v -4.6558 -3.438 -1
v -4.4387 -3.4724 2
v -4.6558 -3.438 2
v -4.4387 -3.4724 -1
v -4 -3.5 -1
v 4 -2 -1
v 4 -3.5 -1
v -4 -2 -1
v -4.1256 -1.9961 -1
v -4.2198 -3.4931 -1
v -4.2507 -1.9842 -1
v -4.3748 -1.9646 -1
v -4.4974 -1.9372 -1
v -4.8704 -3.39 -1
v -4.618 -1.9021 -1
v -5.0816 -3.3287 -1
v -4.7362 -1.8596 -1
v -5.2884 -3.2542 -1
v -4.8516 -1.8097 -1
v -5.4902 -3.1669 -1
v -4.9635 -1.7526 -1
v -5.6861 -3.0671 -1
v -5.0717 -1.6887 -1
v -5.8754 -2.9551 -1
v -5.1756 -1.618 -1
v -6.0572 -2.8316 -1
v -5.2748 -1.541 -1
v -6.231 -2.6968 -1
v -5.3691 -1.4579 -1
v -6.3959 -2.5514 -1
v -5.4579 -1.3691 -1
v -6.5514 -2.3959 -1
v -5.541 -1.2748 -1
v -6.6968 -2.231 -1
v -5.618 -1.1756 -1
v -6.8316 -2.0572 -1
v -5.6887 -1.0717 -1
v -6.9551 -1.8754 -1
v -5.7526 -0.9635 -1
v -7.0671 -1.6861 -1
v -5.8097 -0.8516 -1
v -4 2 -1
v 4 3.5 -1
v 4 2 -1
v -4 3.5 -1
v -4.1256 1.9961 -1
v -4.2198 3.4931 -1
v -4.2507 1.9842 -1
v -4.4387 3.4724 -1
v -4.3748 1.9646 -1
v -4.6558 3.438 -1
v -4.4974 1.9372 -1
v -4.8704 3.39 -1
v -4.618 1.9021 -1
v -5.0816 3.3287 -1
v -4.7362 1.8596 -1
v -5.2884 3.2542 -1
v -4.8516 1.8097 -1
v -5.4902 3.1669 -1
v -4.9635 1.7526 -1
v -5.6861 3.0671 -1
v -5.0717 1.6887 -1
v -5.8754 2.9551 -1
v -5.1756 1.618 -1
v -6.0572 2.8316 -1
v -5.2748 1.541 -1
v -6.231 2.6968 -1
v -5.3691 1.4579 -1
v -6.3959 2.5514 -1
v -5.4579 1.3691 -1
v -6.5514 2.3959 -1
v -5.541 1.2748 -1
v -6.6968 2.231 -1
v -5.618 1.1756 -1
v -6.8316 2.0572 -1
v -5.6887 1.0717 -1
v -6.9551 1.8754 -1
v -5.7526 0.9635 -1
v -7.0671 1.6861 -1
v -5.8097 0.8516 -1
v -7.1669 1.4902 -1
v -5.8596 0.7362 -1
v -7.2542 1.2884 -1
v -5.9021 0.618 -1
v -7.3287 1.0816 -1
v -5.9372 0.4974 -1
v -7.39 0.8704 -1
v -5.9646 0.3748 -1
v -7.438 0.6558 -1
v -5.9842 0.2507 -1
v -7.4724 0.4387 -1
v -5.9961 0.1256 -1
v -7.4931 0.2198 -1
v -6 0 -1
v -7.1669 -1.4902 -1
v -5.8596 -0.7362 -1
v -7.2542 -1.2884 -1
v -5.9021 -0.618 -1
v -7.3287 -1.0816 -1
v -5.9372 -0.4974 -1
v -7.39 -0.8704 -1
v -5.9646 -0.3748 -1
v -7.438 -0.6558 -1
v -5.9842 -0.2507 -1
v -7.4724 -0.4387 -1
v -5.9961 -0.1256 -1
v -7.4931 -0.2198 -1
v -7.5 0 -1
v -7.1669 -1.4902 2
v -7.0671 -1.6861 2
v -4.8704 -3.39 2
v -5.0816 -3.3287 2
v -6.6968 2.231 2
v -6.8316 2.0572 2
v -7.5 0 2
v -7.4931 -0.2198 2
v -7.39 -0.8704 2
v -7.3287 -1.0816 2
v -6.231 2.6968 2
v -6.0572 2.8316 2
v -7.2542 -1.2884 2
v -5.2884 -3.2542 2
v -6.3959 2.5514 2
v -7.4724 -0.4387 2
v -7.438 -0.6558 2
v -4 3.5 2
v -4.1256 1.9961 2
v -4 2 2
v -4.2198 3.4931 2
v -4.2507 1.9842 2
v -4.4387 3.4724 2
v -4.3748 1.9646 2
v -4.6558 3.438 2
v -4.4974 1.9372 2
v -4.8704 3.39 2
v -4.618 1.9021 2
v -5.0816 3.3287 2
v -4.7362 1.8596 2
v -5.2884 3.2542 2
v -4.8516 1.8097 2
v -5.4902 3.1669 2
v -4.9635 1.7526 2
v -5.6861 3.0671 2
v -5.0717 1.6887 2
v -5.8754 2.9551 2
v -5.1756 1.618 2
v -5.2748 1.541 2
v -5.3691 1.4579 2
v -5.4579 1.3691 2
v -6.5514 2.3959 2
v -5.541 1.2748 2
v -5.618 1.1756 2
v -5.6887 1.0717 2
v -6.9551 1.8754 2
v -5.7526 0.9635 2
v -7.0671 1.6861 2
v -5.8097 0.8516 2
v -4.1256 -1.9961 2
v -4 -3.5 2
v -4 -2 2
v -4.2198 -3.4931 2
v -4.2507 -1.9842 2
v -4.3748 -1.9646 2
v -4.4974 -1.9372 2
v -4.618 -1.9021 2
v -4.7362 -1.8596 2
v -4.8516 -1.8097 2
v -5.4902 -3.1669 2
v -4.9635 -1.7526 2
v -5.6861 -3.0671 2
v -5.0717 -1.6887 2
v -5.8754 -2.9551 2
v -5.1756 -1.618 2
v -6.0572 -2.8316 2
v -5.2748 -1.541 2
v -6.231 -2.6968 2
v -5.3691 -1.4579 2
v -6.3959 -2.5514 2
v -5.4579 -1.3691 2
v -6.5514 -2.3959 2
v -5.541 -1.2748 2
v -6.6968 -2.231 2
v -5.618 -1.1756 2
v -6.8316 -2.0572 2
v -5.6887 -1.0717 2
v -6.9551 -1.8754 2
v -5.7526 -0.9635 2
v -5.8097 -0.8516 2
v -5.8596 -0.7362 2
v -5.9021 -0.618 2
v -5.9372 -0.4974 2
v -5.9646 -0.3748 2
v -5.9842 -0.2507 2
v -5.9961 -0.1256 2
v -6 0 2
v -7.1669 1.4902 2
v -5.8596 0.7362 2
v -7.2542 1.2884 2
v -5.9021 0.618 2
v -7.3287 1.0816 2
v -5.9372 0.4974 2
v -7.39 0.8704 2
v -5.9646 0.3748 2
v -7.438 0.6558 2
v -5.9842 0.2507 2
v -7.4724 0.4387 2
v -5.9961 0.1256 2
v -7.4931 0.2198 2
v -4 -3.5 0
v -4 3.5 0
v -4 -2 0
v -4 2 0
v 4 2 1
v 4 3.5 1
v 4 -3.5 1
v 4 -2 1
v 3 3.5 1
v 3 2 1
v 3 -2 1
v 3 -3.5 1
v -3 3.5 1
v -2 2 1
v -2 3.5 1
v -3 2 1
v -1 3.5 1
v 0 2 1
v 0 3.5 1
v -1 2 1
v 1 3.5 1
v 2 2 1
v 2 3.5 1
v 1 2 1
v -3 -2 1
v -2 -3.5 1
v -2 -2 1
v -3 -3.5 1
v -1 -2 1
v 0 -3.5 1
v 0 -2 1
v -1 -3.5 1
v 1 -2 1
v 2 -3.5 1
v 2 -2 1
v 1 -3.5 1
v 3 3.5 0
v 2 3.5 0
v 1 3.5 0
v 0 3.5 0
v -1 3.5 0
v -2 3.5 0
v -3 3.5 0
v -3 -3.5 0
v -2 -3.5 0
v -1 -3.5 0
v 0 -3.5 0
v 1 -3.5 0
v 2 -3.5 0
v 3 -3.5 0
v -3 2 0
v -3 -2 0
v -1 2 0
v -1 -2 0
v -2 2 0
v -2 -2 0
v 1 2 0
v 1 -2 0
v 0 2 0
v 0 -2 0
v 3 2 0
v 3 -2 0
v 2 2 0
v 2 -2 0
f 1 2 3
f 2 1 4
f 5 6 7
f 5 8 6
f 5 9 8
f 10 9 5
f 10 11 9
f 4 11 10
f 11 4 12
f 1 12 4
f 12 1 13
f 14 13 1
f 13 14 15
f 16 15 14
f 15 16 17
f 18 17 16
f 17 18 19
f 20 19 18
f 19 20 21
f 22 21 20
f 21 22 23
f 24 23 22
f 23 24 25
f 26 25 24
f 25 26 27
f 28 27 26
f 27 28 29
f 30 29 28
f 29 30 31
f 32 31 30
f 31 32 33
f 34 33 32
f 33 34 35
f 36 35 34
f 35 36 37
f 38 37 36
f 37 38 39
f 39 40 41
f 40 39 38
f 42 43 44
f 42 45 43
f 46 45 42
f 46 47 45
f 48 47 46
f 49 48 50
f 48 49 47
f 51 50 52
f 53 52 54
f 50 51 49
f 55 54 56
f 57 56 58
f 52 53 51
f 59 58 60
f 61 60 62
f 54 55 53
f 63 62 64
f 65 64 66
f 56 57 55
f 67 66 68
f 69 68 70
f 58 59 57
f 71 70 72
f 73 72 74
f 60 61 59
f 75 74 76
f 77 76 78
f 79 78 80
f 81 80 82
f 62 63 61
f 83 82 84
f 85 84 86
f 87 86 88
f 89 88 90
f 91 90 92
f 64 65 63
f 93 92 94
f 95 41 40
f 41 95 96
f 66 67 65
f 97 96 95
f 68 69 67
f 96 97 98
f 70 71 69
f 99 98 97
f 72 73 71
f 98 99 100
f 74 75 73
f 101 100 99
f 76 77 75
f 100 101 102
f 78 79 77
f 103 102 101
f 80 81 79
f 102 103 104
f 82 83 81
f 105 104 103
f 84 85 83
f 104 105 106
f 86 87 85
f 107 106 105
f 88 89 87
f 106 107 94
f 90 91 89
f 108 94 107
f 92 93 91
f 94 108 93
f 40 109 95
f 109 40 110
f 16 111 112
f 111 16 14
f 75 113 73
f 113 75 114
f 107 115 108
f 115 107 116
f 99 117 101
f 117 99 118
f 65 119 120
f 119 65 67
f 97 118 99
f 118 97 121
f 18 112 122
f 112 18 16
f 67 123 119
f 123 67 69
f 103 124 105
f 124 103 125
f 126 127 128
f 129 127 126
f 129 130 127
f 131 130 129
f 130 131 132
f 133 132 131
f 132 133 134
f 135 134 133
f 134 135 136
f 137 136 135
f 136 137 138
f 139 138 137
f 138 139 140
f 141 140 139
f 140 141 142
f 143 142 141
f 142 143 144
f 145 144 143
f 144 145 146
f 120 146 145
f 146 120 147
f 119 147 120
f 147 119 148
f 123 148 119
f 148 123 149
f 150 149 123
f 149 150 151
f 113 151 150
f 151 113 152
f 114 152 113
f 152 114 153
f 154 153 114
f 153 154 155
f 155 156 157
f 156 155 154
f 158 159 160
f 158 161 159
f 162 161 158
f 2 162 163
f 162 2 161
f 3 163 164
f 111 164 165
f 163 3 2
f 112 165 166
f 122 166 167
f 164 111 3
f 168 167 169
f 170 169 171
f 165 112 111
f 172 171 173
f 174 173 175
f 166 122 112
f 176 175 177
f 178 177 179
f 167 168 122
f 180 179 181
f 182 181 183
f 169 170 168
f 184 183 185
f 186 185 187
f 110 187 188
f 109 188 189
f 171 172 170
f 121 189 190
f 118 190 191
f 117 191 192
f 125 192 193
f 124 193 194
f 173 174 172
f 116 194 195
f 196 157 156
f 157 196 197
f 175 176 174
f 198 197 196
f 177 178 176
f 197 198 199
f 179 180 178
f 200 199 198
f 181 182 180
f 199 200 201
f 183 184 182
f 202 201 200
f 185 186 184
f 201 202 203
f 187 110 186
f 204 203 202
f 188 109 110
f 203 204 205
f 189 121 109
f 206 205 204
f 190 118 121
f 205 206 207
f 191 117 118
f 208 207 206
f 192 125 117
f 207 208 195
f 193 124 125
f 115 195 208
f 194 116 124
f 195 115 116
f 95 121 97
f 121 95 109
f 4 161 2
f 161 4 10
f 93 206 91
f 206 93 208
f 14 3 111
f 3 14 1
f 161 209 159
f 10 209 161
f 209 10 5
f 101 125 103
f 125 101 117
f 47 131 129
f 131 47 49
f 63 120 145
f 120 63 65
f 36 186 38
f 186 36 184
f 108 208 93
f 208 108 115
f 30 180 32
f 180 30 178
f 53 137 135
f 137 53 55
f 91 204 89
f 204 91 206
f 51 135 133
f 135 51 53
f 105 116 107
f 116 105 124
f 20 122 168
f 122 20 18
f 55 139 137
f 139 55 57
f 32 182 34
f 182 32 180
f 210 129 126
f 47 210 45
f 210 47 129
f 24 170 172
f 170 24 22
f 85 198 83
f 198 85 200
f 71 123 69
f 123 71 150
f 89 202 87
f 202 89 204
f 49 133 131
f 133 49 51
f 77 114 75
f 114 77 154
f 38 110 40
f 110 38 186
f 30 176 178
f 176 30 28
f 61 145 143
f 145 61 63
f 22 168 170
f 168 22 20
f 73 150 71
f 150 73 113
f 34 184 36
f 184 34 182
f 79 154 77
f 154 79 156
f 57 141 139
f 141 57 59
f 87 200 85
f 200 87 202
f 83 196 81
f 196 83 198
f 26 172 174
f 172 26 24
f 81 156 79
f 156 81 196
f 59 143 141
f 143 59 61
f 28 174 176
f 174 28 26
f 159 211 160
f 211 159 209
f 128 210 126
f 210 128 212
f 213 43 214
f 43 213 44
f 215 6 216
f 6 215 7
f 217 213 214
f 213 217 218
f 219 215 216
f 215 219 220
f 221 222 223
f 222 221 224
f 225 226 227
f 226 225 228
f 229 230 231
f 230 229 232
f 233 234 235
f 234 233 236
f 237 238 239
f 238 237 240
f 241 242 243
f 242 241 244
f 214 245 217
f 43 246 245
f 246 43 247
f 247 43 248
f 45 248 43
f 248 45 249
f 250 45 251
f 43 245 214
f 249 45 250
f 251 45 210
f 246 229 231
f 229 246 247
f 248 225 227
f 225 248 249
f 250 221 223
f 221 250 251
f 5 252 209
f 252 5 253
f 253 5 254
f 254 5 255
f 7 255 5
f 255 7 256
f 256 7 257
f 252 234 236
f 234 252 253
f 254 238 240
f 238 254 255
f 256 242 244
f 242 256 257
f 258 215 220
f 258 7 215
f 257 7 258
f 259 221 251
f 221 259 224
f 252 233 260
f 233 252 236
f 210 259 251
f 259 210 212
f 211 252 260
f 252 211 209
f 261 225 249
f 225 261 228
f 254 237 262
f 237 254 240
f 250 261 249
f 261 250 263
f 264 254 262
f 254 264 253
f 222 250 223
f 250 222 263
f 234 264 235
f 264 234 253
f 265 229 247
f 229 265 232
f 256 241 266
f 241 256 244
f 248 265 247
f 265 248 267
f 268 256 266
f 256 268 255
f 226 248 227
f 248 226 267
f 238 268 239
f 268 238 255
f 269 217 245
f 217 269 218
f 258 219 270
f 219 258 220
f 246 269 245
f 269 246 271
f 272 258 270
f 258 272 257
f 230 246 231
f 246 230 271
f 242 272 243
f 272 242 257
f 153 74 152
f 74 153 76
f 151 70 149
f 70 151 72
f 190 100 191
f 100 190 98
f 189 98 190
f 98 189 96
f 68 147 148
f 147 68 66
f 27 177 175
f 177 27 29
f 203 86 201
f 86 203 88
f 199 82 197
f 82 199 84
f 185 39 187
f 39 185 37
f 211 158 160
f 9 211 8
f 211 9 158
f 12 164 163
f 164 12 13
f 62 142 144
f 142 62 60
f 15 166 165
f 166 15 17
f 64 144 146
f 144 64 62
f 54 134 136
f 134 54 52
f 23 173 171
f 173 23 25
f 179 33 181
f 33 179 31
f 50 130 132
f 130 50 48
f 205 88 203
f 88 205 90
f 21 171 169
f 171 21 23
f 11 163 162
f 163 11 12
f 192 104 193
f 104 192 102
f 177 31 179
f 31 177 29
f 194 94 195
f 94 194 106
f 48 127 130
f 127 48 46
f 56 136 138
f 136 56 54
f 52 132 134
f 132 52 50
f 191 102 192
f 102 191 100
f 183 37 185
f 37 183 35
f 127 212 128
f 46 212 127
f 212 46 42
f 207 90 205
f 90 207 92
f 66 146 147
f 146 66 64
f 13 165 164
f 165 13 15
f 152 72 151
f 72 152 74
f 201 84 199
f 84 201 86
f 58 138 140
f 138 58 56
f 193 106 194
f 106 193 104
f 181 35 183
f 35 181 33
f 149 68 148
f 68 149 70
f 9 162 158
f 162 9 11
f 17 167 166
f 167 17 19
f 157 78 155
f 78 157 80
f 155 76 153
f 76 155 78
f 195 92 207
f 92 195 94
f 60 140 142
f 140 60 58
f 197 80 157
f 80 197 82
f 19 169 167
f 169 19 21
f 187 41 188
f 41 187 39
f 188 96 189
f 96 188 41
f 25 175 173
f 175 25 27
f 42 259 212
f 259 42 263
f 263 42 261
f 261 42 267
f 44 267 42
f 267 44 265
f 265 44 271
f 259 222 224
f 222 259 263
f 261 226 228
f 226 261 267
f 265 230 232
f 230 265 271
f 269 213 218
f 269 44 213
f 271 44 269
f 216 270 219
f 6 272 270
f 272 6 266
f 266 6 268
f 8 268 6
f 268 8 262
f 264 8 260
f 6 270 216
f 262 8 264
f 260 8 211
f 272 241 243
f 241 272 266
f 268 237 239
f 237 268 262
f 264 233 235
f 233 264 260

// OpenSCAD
POLE_RADIUS=2;
WALL_HEIGHT=2;

TOOTH_DEPTH=1;
TOOTH_WIDTH=1;

WALL_THICK = 3;

BASE_WIDTH = POLE_RADIUS * 2 + WALL_THICK;
BASE_LENGHT = BASE_WIDTH + 1;


difference() {
    difference() {
        union() {
            cube([BASE_LENGHT, BASE_WIDTH, WALL_HEIGHT], true);

            difference() {
            translate([-(BASE_LENGHT / 2), 0, WALL_HEIGHT / 4])
                cylinder(h = WALL_HEIGHT + TOOTH_DEPTH, r = BASE_WIDTH / 2, center = true, $fn = 100);

            translate([-(BASE_LENGHT / 2), -BASE_WIDTH, 0])
            	cube([BASE_WIDTH + 2, BASE_WIDTH + 4, (WALL_HEIGHT + TOOTH_DEPTH) * 2]); 
            }
        }

        for(i = [0:BASE_LENGHT / (TOOTH_WIDTH * 2) - 1]) {
            STEP = TOOTH_WIDTH * 2;
            START = (BASE_LENGHT / 2) - (TOOTH_WIDTH / 2);
            translate([(-START + STEP * i), 0, TOOTH_DEPTH])
                cube([TOOTH_WIDTH, BASE_WIDTH * 2, TOOTH_DEPTH * 2], true);
        }
    }
    union() {
        translate([-(BASE_LENGHT / 2), 0, 0])
            cylinder(h = WALL_HEIGHT * 4, r = POLE_RADIUS, center = true, $fn = 100);
        translate([1, 0, 0])
            cube([BASE_LENGHT + 2, POLE_RADIUS * 2, WALL_HEIGHT * 2 + 2], center = true);
    }
}
